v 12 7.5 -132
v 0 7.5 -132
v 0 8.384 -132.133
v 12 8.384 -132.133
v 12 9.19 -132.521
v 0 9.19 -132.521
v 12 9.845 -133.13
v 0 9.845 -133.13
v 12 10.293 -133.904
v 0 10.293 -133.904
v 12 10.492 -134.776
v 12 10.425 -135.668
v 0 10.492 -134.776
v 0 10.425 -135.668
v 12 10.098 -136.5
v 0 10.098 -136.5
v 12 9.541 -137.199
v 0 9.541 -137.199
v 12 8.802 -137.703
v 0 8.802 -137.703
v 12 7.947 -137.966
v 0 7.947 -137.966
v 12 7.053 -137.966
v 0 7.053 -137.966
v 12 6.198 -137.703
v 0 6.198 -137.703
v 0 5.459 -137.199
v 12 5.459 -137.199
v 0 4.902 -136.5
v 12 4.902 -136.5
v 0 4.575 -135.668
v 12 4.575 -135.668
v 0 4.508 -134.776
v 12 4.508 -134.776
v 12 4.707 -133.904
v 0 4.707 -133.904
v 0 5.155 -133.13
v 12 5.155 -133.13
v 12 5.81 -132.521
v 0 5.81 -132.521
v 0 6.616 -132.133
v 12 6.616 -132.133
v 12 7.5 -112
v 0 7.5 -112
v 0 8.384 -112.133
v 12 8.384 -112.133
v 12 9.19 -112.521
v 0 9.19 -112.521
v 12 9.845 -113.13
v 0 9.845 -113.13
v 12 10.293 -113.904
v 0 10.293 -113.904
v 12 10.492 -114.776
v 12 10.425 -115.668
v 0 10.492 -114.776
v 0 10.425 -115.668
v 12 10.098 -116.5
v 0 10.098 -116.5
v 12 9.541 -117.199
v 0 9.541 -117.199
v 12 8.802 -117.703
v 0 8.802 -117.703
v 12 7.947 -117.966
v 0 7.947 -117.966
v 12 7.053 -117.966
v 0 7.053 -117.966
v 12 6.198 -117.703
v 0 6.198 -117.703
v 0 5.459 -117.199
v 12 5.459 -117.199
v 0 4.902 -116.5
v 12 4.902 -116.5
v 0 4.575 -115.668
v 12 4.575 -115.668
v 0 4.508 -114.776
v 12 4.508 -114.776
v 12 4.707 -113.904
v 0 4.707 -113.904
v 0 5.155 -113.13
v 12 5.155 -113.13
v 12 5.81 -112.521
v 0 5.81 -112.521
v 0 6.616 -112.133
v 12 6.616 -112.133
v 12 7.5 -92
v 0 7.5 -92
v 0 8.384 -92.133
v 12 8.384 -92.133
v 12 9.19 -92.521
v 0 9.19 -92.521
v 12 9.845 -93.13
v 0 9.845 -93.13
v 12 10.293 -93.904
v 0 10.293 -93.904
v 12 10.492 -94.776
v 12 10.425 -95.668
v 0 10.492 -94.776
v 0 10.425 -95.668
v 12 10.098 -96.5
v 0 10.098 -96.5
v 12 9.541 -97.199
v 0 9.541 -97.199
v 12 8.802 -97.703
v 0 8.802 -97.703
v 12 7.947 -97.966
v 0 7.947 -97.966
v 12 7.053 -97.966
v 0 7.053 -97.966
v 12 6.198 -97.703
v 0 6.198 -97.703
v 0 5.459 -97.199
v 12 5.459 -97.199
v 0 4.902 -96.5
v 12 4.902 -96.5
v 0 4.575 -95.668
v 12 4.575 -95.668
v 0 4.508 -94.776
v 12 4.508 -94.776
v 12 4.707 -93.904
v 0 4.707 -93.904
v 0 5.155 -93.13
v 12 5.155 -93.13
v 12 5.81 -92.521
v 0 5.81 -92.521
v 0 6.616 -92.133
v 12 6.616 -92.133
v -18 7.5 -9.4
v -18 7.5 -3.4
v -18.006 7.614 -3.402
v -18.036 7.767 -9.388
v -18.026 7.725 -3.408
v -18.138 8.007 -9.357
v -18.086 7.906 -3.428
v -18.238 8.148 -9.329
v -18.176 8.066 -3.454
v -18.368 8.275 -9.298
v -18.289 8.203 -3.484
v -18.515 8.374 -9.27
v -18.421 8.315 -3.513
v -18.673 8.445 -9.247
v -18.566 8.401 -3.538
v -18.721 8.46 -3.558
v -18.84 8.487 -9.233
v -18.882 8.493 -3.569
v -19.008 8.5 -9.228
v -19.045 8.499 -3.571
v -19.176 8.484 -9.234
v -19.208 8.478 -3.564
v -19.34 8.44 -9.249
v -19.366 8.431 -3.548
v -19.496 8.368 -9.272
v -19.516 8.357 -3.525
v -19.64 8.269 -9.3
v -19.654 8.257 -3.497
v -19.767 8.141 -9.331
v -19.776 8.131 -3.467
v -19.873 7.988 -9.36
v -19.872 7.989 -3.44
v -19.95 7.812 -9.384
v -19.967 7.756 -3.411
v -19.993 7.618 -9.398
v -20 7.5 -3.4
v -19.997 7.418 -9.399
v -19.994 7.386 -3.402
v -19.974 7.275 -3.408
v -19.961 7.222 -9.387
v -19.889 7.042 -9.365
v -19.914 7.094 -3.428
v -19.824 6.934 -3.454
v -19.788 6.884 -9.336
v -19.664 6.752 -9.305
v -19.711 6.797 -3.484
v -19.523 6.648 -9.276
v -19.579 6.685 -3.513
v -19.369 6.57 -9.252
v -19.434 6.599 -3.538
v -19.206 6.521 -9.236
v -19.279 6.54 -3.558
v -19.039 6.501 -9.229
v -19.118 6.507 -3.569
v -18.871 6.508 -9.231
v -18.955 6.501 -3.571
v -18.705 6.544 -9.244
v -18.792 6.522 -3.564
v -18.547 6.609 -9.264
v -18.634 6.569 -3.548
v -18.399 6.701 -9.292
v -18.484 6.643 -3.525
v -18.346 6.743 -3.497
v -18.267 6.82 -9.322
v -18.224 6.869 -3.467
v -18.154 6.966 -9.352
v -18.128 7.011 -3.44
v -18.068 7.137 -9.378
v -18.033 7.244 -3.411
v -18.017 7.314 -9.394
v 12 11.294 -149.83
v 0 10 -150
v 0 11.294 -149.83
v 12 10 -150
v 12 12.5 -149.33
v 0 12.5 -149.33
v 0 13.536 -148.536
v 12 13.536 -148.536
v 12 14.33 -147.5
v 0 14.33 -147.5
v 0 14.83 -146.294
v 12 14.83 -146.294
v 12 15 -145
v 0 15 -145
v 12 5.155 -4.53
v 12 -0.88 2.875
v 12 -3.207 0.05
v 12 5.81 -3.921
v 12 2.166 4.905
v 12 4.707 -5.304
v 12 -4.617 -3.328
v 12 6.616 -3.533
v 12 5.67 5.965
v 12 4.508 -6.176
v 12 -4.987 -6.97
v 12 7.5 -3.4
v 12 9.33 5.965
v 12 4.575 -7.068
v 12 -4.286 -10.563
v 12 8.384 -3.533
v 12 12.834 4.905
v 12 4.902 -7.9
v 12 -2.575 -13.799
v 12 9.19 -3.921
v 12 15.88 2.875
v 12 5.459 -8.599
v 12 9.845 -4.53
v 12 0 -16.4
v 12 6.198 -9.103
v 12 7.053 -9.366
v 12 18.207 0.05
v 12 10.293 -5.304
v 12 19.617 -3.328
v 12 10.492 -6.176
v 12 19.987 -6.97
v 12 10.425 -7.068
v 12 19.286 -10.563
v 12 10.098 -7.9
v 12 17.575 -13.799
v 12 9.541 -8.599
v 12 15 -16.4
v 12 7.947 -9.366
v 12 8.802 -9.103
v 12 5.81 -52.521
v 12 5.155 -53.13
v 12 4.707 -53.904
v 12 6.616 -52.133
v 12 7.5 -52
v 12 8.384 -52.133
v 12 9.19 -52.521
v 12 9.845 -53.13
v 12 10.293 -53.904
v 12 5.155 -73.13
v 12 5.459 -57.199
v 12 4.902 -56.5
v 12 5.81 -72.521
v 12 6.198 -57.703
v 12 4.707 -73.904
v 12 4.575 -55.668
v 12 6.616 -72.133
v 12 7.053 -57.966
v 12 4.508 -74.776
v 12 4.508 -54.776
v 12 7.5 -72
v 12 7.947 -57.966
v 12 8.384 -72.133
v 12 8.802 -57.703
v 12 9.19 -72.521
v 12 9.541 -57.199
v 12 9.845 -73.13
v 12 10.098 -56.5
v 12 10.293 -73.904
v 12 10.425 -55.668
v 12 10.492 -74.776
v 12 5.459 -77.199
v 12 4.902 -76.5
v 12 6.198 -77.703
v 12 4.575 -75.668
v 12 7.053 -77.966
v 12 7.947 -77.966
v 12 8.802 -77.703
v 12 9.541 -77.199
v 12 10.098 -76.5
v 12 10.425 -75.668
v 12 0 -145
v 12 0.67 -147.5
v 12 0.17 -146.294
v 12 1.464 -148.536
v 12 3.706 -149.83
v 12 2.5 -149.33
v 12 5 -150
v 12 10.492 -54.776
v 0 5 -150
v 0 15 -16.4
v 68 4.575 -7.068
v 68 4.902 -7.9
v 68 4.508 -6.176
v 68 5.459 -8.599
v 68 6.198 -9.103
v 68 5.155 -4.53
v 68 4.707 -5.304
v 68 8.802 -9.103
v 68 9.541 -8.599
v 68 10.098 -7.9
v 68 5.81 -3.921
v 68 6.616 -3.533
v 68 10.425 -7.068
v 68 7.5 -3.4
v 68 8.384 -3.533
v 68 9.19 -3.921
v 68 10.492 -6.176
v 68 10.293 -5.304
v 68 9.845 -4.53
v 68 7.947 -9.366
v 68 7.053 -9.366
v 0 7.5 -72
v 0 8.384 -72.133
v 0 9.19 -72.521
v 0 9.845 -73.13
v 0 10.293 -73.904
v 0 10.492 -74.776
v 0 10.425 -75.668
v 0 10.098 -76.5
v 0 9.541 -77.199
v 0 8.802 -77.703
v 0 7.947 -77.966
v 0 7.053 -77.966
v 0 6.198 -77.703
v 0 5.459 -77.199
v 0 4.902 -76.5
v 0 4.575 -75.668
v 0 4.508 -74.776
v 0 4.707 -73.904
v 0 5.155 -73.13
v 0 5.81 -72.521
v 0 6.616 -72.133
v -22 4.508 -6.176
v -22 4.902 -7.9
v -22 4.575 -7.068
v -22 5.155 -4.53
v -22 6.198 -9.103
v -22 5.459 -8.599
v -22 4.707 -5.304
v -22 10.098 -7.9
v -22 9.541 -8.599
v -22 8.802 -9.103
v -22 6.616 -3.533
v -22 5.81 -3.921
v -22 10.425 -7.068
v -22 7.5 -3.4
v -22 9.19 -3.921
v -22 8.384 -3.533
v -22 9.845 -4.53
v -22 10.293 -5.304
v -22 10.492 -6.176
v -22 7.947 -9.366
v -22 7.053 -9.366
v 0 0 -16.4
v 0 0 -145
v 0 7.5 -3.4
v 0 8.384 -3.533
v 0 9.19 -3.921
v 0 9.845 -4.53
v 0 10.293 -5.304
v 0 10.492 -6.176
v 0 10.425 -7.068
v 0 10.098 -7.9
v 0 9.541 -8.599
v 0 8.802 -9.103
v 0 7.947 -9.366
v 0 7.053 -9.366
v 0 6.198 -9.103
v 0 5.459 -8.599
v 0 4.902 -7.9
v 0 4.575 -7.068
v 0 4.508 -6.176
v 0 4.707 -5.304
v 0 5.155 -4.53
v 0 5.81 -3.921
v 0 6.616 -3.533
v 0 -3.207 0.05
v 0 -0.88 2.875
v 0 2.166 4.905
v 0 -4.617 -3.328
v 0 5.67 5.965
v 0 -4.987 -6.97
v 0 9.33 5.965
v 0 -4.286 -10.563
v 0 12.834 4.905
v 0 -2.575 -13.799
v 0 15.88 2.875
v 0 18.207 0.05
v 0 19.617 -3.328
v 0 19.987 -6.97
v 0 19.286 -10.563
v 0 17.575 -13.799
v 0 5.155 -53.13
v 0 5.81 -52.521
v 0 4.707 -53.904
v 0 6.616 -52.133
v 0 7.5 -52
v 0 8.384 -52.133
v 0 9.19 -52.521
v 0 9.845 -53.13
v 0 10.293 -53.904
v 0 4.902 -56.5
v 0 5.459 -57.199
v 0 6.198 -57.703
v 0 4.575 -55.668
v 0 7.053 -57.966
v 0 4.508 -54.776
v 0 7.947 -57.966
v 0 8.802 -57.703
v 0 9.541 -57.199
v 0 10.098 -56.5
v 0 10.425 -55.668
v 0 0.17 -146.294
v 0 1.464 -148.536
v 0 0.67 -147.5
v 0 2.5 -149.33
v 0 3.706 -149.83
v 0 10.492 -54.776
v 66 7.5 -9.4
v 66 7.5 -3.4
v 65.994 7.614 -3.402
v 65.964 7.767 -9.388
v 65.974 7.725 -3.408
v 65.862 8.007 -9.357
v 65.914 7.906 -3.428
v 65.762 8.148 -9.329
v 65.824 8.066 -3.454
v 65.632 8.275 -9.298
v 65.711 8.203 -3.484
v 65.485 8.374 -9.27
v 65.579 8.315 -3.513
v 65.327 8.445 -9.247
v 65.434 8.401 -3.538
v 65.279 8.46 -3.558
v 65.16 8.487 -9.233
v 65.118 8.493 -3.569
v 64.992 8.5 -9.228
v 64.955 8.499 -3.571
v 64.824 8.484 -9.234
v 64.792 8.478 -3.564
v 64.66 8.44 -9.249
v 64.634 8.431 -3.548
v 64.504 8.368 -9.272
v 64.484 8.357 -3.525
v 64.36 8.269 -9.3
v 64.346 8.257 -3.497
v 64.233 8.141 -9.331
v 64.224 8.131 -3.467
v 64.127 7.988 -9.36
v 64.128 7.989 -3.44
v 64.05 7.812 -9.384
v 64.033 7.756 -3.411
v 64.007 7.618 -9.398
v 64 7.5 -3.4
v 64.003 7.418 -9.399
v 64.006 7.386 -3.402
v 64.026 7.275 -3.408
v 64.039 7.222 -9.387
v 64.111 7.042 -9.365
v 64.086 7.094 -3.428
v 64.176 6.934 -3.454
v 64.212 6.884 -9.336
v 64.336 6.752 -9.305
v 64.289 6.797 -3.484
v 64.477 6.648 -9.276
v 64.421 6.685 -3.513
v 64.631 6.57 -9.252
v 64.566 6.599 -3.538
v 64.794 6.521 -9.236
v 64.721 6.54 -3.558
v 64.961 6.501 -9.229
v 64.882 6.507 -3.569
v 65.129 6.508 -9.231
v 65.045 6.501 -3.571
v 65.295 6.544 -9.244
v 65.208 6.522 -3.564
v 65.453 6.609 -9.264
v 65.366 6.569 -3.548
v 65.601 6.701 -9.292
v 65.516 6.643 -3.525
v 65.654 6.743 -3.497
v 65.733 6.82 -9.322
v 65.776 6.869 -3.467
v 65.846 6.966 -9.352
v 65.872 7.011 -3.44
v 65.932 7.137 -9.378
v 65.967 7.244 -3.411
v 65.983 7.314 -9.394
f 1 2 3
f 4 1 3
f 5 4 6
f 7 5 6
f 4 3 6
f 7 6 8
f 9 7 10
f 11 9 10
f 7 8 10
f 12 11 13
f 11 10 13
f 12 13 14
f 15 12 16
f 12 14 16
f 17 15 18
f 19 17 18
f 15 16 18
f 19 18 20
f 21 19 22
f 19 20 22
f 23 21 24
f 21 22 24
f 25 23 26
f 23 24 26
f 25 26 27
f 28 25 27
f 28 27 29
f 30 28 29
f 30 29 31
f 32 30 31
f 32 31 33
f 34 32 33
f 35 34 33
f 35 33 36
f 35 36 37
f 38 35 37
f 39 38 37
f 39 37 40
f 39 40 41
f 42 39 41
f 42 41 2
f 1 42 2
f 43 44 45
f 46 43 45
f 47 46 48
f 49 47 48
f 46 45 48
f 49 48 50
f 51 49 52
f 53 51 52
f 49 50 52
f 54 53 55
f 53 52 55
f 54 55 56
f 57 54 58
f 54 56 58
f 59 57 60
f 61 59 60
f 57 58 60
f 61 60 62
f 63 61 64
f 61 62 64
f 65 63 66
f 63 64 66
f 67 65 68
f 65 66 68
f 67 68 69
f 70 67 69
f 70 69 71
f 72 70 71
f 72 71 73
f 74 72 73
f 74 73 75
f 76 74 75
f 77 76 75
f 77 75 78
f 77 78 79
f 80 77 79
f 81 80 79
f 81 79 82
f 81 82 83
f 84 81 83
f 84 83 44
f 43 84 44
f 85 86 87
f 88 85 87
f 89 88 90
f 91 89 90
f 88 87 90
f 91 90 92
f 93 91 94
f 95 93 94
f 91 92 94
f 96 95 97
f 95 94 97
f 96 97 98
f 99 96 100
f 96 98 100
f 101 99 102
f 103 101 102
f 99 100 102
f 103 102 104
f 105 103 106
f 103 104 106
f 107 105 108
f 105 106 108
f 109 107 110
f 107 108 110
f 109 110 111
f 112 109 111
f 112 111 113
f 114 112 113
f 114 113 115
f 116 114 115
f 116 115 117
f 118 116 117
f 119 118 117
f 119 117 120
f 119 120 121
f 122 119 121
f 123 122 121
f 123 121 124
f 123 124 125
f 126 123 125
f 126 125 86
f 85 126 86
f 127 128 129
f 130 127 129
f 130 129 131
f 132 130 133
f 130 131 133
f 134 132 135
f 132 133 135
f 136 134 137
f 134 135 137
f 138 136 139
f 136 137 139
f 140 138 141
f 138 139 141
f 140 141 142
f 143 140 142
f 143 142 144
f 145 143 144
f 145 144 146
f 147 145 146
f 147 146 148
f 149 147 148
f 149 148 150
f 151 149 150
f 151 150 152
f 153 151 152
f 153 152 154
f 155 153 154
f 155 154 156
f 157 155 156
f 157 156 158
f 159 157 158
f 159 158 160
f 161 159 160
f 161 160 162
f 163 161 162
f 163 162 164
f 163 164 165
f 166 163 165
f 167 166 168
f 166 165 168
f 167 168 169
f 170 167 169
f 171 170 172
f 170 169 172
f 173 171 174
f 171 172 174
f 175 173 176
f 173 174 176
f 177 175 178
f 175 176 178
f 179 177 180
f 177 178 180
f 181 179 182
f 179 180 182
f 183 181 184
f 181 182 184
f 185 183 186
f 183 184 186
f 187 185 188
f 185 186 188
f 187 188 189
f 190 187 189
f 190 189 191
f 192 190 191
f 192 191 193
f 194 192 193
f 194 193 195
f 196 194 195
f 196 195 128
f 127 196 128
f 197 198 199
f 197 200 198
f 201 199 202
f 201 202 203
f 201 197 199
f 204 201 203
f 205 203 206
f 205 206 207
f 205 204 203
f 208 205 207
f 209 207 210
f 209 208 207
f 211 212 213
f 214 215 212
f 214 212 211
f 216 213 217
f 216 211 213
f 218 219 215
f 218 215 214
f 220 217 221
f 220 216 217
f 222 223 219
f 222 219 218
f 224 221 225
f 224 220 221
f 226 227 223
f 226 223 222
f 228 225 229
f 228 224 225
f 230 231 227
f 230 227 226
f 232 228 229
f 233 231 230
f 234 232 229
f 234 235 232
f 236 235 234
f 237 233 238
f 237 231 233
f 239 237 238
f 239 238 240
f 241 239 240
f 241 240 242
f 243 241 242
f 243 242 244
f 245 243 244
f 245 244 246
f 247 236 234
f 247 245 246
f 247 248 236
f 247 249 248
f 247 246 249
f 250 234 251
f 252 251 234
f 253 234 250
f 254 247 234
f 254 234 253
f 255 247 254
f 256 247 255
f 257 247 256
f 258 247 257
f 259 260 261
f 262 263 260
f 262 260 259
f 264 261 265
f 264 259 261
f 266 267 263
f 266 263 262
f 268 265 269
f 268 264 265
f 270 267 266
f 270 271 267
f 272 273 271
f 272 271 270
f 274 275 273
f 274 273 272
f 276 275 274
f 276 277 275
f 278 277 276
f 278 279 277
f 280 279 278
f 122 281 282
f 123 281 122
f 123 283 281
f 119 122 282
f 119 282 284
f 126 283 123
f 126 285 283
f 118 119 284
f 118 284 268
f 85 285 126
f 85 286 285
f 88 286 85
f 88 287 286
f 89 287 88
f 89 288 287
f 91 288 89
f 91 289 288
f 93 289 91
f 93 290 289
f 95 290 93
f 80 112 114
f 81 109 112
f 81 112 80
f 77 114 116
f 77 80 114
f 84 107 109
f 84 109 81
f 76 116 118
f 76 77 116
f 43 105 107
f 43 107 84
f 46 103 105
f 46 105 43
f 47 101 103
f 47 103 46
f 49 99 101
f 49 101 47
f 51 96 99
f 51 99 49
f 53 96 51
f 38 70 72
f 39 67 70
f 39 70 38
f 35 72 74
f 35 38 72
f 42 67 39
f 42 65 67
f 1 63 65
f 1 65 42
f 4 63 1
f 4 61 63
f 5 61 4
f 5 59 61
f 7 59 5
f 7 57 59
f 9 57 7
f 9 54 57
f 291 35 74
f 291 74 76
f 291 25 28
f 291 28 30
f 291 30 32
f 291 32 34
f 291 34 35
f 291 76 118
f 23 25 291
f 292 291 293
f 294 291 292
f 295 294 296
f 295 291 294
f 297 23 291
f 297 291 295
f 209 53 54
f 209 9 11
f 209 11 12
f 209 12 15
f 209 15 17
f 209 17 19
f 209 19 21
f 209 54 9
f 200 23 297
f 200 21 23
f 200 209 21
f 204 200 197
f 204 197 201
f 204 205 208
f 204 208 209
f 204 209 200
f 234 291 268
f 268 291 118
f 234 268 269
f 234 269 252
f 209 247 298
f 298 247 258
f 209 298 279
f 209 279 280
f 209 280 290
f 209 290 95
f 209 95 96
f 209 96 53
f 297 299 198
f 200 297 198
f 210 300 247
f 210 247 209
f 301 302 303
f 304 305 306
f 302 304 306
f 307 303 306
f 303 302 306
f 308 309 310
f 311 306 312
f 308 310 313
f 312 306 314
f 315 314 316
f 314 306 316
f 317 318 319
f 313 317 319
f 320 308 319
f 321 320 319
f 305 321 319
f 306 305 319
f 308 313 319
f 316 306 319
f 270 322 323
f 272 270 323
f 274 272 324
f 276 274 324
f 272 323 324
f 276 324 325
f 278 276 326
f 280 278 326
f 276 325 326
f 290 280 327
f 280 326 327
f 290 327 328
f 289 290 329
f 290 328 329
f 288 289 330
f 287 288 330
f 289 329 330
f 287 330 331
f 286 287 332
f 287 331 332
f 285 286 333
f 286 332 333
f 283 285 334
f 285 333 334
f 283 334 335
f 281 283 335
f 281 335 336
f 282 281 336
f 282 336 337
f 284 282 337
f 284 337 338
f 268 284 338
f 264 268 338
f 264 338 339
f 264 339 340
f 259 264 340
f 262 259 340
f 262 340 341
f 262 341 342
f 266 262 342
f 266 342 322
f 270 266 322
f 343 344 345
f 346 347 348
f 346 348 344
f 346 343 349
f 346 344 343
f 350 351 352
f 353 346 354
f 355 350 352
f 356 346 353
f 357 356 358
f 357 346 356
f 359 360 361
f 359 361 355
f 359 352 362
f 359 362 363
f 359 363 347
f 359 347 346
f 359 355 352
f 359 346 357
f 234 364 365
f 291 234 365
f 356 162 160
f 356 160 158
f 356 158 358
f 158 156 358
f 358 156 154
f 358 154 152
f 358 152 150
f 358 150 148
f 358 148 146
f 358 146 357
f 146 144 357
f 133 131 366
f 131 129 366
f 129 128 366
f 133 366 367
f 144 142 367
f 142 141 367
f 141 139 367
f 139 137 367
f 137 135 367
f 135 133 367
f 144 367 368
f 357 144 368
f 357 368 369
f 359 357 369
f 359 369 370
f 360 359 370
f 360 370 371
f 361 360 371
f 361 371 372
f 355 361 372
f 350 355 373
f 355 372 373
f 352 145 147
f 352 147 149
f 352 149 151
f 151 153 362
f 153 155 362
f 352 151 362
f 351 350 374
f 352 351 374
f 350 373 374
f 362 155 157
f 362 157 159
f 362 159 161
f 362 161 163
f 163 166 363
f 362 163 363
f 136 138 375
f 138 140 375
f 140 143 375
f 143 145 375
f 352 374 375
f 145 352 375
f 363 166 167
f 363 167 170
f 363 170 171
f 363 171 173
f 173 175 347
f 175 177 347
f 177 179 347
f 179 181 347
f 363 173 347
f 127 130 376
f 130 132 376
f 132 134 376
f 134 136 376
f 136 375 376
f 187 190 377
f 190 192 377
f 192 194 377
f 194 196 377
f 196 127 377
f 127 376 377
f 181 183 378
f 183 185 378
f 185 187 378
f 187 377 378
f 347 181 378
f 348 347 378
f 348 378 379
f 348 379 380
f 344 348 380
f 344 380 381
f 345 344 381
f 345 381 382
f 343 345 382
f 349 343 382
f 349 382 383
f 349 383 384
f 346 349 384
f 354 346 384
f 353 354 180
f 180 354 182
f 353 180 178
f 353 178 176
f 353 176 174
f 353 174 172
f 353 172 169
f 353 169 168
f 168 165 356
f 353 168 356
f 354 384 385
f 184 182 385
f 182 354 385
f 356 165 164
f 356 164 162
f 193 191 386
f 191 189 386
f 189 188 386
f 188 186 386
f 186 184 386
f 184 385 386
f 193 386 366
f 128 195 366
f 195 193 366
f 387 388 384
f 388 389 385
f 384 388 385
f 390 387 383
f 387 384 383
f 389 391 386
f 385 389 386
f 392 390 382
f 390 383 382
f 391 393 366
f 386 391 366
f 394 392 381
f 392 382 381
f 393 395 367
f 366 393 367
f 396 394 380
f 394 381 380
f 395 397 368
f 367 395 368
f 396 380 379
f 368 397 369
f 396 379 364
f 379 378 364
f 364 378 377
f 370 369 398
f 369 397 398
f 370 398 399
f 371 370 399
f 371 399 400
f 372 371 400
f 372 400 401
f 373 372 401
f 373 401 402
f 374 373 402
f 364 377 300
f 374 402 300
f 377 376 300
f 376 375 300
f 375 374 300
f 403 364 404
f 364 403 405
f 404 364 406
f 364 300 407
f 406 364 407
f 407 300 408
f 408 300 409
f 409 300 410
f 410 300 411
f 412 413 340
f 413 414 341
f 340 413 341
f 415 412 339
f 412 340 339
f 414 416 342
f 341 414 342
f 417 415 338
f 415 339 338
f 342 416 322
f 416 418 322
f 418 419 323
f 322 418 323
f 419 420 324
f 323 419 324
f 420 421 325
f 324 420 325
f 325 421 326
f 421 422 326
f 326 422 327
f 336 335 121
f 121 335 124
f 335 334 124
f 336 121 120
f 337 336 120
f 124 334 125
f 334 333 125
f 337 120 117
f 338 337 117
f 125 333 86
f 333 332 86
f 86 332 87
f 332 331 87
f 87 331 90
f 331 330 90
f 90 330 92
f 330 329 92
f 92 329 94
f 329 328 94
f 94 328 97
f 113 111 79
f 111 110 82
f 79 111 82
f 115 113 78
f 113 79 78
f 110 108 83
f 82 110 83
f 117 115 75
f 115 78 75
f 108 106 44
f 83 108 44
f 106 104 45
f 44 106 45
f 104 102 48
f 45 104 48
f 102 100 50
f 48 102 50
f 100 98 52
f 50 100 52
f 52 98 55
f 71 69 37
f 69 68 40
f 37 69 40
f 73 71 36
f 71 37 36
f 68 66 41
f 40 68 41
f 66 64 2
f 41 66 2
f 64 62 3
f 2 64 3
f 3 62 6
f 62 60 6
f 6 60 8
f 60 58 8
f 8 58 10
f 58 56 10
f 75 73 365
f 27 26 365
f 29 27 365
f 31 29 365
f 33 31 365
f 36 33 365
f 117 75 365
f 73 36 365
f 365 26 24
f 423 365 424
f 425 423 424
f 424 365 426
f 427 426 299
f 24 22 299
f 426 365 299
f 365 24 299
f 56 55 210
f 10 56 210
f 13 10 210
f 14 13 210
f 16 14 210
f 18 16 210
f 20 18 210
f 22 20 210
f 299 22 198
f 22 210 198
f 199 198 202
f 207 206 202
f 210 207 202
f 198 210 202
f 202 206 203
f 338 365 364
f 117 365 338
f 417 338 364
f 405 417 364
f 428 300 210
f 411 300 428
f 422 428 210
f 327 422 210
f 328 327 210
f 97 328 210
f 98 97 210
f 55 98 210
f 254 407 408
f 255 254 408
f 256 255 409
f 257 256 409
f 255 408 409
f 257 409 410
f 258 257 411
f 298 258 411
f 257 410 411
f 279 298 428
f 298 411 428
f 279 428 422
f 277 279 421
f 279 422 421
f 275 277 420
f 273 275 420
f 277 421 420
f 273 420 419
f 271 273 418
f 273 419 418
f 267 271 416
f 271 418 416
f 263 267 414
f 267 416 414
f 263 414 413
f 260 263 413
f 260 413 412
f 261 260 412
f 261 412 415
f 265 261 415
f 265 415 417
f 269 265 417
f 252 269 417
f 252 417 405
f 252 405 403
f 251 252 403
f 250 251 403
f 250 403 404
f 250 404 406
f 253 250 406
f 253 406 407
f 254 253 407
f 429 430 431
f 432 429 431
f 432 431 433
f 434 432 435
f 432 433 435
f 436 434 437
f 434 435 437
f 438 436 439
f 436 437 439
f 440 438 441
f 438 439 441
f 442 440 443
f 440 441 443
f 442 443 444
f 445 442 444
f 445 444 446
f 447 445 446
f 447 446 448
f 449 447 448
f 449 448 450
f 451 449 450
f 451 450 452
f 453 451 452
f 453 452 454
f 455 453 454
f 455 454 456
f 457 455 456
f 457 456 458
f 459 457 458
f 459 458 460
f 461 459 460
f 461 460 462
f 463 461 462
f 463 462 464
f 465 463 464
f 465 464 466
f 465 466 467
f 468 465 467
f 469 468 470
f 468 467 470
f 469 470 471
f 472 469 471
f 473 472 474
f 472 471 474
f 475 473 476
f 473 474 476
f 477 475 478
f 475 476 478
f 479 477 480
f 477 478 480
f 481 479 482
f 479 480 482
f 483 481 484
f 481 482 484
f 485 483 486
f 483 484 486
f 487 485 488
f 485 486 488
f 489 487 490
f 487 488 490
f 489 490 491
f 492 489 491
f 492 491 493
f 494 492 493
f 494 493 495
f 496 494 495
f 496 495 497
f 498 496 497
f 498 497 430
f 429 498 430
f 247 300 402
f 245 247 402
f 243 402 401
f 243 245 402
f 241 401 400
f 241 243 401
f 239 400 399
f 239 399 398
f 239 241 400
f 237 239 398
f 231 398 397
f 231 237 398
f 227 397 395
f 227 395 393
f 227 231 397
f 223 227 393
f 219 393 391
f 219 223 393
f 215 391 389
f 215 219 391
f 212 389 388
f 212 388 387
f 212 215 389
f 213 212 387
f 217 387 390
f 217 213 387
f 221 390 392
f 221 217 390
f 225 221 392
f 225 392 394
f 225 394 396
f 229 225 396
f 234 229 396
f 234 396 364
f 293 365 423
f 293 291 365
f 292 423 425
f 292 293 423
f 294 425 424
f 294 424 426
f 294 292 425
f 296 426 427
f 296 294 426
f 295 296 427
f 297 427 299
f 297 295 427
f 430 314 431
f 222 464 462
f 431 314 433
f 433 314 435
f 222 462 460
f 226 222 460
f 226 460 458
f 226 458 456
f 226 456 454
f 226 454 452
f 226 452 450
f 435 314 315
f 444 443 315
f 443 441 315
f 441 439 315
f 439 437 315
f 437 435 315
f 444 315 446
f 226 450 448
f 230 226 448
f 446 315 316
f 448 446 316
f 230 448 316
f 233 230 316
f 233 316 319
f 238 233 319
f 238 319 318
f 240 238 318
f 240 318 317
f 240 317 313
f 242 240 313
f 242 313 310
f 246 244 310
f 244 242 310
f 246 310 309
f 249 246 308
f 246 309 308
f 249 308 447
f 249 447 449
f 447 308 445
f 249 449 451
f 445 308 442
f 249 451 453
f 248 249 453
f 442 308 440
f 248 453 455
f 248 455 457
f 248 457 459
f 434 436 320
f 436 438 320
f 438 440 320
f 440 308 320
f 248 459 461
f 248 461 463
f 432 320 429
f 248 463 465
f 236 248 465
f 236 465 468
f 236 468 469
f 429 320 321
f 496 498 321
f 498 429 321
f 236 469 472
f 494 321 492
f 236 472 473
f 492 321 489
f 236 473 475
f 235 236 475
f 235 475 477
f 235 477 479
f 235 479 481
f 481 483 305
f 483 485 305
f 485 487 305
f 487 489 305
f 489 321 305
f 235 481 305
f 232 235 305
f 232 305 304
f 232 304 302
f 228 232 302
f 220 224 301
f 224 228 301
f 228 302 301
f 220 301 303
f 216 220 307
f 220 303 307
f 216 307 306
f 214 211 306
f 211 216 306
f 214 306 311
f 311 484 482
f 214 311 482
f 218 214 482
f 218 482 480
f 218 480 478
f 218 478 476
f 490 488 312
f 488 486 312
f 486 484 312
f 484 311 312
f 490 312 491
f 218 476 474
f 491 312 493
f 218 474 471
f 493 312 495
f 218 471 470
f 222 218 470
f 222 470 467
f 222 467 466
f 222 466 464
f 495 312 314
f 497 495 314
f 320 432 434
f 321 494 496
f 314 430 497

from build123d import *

# Parameters (mm, degrees)
SKETCH_1_W           = 150
SKETCH_1_H           = 15
EXTRUDE_1_DEPTH      = 12
FILLET_1_R           = 5
SKETCH_6_R           = 12.5
EXTRUDE_2_DEPTH      = 12
EXTRUDE_5_DEPTH      = 22
EXTRUDE_5_DEPTH_BACK = 68
SKETCH_15_R          = 3
CUT_EXTRUDE_9_REACH  = 167.904
SKETCH_16_R          = 1
CUT_EXTRUDE_10_REACH = 167.904
SKETCH_17_R          = 3


with BuildPart() as part:
    # 草图1 → 凸台-拉伸1 (new body)
    with BuildSketch(Plane(origin=(0, 0, 0), x_dir=(0, 0, -1), z_dir=(1, 0, 0))):
        with Locations((75, 7.5)):
            Rectangle(SKETCH_1_W, SKETCH_1_H)
    extrude(amount=EXTRUDE_1_DEPTH)

    # 圆角1
    fillet_1_edges = [part.edges().sort_by_distance(p)[0] for p in [
        (6, 15, 0),
        (6, 15, -150),
        (6, 0, -150),
        (6, 0, 0),
    ]]
    fillet(fillet_1_edges, radius=FILLET_1_R)

    # 草图6 → 凸台-拉伸2 (add)
    with BuildSketch(Plane(origin=(12, 0, 0), x_dir=(0, 0, -1), z_dir=(1, 0, 0))):
        with Locations((6.4, 7.5)):
            Circle(SKETCH_6_R)
    extrude(amount=-EXTRUDE_2_DEPTH)

    # 草图15 → 凸台-拉伸5 (add, two sides: drawn at the far end of the back side and taken through both)
    with BuildSketch(Plane.ZY.offset(-EXTRUDE_5_DEPTH_BACK)):
        with Locations((-6.4, 7.5)):
            Circle(SKETCH_15_R)
    extrude(amount=EXTRUDE_5_DEPTH + EXTRUDE_5_DEPTH_BACK)

    # 草图16 → 切除-拉伸9 (cut, up to next)
    with BuildSketch(Plane.XY, mode=Mode.PRIVATE) as cut_extrude_9_sk1:
        with Locations((-19, 7.5)):
            Circle(SKETCH_16_R)
    cut_extrude_9_tool1 = extrude(cut_extrude_9_sk1.sketch, amount=-CUT_EXTRUDE_9_REACH, mode=Mode.PRIVATE) & part.part
    # 草图16 → 切除-拉伸9 (cut, up to next)
    with BuildSketch(Plane.XY, mode=Mode.PRIVATE) as cut_extrude_9_sk2:
        with Locations((65, 7.5)):
            Circle(SKETCH_16_R)
    cut_extrude_9_tool2 = extrude(cut_extrude_9_sk2.sketch, amount=-CUT_EXTRUDE_9_REACH, mode=Mode.PRIVATE) & part.part
    add(cut_extrude_9_tool1.solids().sort_by_distance((-19, 7.5, 0))[0], mode=Mode.SUBTRACT)
    add(cut_extrude_9_tool2.solids().sort_by_distance((65, 7.5, 0))[0], mode=Mode.SUBTRACT)

    # 草图17 → 切除-拉伸10 (cut, up to next)
    with BuildSketch(Plane.ZY, mode=Mode.PRIVATE) as cut_extrude_10_sk1:
        with Locations((-135, 7.5)):
            Circle(SKETCH_17_R)
    cut_extrude_10_tool1 = extrude(cut_extrude_10_sk1.sketch, amount=-CUT_EXTRUDE_10_REACH, mode=Mode.PRIVATE) & part.part
    # 草图17 → 切除-拉伸10 (cut, up to next)
    with BuildSketch(Plane.ZY, mode=Mode.PRIVATE) as cut_extrude_10_sk2:
        with Locations((-115, 7.5)):
            Circle(SKETCH_17_R)
    cut_extrude_10_tool2 = extrude(cut_extrude_10_sk2.sketch, amount=-CUT_EXTRUDE_10_REACH, mode=Mode.PRIVATE) & part.part
    # 草图17 → 切除-拉伸10 (cut, up to next)
    with BuildSketch(Plane.ZY, mode=Mode.PRIVATE) as cut_extrude_10_sk3:
        with Locations((-95, 7.5)):
            Circle(SKETCH_17_R)
    cut_extrude_10_tool3 = extrude(cut_extrude_10_sk3.sketch, amount=-CUT_EXTRUDE_10_REACH, mode=Mode.PRIVATE) & part.part
    # 草图17 → 切除-拉伸10 (cut, up to next)
    with BuildSketch(Plane.ZY, mode=Mode.PRIVATE) as cut_extrude_10_sk4:
        with Locations((-75, 7.5)):
            Circle(SKETCH_17_R)
    cut_extrude_10_tool4 = extrude(cut_extrude_10_sk4.sketch, amount=-CUT_EXTRUDE_10_REACH, mode=Mode.PRIVATE) & part.part
    # 草图17 → 切除-拉伸10 (cut, up to next)
    with BuildSketch(Plane.ZY, mode=Mode.PRIVATE) as cut_extrude_10_sk5:
        with Locations((-55, 7.5)):
            Circle(SKETCH_17_R)
    cut_extrude_10_tool5 = extrude(cut_extrude_10_sk5.sketch, amount=-CUT_EXTRUDE_10_REACH, mode=Mode.PRIVATE) & part.part
    add(cut_extrude_10_tool1.solids().sort_by_distance((0, 7.5, -135))[0], mode=Mode.SUBTRACT)
    add(cut_extrude_10_tool2.solids().sort_by_distance((0, 7.5, -115))[0], mode=Mode.SUBTRACT)
    add(cut_extrude_10_tool3.solids().sort_by_distance((0, 7.5, -95))[0], mode=Mode.SUBTRACT)
    add(cut_extrude_10_tool4.solids().sort_by_distance((0, 7.5, -75))[0], mode=Mode.SUBTRACT)
    add(cut_extrude_10_tool5.solids().sort_by_distance((0, 7.5, -55))[0], mode=Mode.SUBTRACT)


solid = part.part
